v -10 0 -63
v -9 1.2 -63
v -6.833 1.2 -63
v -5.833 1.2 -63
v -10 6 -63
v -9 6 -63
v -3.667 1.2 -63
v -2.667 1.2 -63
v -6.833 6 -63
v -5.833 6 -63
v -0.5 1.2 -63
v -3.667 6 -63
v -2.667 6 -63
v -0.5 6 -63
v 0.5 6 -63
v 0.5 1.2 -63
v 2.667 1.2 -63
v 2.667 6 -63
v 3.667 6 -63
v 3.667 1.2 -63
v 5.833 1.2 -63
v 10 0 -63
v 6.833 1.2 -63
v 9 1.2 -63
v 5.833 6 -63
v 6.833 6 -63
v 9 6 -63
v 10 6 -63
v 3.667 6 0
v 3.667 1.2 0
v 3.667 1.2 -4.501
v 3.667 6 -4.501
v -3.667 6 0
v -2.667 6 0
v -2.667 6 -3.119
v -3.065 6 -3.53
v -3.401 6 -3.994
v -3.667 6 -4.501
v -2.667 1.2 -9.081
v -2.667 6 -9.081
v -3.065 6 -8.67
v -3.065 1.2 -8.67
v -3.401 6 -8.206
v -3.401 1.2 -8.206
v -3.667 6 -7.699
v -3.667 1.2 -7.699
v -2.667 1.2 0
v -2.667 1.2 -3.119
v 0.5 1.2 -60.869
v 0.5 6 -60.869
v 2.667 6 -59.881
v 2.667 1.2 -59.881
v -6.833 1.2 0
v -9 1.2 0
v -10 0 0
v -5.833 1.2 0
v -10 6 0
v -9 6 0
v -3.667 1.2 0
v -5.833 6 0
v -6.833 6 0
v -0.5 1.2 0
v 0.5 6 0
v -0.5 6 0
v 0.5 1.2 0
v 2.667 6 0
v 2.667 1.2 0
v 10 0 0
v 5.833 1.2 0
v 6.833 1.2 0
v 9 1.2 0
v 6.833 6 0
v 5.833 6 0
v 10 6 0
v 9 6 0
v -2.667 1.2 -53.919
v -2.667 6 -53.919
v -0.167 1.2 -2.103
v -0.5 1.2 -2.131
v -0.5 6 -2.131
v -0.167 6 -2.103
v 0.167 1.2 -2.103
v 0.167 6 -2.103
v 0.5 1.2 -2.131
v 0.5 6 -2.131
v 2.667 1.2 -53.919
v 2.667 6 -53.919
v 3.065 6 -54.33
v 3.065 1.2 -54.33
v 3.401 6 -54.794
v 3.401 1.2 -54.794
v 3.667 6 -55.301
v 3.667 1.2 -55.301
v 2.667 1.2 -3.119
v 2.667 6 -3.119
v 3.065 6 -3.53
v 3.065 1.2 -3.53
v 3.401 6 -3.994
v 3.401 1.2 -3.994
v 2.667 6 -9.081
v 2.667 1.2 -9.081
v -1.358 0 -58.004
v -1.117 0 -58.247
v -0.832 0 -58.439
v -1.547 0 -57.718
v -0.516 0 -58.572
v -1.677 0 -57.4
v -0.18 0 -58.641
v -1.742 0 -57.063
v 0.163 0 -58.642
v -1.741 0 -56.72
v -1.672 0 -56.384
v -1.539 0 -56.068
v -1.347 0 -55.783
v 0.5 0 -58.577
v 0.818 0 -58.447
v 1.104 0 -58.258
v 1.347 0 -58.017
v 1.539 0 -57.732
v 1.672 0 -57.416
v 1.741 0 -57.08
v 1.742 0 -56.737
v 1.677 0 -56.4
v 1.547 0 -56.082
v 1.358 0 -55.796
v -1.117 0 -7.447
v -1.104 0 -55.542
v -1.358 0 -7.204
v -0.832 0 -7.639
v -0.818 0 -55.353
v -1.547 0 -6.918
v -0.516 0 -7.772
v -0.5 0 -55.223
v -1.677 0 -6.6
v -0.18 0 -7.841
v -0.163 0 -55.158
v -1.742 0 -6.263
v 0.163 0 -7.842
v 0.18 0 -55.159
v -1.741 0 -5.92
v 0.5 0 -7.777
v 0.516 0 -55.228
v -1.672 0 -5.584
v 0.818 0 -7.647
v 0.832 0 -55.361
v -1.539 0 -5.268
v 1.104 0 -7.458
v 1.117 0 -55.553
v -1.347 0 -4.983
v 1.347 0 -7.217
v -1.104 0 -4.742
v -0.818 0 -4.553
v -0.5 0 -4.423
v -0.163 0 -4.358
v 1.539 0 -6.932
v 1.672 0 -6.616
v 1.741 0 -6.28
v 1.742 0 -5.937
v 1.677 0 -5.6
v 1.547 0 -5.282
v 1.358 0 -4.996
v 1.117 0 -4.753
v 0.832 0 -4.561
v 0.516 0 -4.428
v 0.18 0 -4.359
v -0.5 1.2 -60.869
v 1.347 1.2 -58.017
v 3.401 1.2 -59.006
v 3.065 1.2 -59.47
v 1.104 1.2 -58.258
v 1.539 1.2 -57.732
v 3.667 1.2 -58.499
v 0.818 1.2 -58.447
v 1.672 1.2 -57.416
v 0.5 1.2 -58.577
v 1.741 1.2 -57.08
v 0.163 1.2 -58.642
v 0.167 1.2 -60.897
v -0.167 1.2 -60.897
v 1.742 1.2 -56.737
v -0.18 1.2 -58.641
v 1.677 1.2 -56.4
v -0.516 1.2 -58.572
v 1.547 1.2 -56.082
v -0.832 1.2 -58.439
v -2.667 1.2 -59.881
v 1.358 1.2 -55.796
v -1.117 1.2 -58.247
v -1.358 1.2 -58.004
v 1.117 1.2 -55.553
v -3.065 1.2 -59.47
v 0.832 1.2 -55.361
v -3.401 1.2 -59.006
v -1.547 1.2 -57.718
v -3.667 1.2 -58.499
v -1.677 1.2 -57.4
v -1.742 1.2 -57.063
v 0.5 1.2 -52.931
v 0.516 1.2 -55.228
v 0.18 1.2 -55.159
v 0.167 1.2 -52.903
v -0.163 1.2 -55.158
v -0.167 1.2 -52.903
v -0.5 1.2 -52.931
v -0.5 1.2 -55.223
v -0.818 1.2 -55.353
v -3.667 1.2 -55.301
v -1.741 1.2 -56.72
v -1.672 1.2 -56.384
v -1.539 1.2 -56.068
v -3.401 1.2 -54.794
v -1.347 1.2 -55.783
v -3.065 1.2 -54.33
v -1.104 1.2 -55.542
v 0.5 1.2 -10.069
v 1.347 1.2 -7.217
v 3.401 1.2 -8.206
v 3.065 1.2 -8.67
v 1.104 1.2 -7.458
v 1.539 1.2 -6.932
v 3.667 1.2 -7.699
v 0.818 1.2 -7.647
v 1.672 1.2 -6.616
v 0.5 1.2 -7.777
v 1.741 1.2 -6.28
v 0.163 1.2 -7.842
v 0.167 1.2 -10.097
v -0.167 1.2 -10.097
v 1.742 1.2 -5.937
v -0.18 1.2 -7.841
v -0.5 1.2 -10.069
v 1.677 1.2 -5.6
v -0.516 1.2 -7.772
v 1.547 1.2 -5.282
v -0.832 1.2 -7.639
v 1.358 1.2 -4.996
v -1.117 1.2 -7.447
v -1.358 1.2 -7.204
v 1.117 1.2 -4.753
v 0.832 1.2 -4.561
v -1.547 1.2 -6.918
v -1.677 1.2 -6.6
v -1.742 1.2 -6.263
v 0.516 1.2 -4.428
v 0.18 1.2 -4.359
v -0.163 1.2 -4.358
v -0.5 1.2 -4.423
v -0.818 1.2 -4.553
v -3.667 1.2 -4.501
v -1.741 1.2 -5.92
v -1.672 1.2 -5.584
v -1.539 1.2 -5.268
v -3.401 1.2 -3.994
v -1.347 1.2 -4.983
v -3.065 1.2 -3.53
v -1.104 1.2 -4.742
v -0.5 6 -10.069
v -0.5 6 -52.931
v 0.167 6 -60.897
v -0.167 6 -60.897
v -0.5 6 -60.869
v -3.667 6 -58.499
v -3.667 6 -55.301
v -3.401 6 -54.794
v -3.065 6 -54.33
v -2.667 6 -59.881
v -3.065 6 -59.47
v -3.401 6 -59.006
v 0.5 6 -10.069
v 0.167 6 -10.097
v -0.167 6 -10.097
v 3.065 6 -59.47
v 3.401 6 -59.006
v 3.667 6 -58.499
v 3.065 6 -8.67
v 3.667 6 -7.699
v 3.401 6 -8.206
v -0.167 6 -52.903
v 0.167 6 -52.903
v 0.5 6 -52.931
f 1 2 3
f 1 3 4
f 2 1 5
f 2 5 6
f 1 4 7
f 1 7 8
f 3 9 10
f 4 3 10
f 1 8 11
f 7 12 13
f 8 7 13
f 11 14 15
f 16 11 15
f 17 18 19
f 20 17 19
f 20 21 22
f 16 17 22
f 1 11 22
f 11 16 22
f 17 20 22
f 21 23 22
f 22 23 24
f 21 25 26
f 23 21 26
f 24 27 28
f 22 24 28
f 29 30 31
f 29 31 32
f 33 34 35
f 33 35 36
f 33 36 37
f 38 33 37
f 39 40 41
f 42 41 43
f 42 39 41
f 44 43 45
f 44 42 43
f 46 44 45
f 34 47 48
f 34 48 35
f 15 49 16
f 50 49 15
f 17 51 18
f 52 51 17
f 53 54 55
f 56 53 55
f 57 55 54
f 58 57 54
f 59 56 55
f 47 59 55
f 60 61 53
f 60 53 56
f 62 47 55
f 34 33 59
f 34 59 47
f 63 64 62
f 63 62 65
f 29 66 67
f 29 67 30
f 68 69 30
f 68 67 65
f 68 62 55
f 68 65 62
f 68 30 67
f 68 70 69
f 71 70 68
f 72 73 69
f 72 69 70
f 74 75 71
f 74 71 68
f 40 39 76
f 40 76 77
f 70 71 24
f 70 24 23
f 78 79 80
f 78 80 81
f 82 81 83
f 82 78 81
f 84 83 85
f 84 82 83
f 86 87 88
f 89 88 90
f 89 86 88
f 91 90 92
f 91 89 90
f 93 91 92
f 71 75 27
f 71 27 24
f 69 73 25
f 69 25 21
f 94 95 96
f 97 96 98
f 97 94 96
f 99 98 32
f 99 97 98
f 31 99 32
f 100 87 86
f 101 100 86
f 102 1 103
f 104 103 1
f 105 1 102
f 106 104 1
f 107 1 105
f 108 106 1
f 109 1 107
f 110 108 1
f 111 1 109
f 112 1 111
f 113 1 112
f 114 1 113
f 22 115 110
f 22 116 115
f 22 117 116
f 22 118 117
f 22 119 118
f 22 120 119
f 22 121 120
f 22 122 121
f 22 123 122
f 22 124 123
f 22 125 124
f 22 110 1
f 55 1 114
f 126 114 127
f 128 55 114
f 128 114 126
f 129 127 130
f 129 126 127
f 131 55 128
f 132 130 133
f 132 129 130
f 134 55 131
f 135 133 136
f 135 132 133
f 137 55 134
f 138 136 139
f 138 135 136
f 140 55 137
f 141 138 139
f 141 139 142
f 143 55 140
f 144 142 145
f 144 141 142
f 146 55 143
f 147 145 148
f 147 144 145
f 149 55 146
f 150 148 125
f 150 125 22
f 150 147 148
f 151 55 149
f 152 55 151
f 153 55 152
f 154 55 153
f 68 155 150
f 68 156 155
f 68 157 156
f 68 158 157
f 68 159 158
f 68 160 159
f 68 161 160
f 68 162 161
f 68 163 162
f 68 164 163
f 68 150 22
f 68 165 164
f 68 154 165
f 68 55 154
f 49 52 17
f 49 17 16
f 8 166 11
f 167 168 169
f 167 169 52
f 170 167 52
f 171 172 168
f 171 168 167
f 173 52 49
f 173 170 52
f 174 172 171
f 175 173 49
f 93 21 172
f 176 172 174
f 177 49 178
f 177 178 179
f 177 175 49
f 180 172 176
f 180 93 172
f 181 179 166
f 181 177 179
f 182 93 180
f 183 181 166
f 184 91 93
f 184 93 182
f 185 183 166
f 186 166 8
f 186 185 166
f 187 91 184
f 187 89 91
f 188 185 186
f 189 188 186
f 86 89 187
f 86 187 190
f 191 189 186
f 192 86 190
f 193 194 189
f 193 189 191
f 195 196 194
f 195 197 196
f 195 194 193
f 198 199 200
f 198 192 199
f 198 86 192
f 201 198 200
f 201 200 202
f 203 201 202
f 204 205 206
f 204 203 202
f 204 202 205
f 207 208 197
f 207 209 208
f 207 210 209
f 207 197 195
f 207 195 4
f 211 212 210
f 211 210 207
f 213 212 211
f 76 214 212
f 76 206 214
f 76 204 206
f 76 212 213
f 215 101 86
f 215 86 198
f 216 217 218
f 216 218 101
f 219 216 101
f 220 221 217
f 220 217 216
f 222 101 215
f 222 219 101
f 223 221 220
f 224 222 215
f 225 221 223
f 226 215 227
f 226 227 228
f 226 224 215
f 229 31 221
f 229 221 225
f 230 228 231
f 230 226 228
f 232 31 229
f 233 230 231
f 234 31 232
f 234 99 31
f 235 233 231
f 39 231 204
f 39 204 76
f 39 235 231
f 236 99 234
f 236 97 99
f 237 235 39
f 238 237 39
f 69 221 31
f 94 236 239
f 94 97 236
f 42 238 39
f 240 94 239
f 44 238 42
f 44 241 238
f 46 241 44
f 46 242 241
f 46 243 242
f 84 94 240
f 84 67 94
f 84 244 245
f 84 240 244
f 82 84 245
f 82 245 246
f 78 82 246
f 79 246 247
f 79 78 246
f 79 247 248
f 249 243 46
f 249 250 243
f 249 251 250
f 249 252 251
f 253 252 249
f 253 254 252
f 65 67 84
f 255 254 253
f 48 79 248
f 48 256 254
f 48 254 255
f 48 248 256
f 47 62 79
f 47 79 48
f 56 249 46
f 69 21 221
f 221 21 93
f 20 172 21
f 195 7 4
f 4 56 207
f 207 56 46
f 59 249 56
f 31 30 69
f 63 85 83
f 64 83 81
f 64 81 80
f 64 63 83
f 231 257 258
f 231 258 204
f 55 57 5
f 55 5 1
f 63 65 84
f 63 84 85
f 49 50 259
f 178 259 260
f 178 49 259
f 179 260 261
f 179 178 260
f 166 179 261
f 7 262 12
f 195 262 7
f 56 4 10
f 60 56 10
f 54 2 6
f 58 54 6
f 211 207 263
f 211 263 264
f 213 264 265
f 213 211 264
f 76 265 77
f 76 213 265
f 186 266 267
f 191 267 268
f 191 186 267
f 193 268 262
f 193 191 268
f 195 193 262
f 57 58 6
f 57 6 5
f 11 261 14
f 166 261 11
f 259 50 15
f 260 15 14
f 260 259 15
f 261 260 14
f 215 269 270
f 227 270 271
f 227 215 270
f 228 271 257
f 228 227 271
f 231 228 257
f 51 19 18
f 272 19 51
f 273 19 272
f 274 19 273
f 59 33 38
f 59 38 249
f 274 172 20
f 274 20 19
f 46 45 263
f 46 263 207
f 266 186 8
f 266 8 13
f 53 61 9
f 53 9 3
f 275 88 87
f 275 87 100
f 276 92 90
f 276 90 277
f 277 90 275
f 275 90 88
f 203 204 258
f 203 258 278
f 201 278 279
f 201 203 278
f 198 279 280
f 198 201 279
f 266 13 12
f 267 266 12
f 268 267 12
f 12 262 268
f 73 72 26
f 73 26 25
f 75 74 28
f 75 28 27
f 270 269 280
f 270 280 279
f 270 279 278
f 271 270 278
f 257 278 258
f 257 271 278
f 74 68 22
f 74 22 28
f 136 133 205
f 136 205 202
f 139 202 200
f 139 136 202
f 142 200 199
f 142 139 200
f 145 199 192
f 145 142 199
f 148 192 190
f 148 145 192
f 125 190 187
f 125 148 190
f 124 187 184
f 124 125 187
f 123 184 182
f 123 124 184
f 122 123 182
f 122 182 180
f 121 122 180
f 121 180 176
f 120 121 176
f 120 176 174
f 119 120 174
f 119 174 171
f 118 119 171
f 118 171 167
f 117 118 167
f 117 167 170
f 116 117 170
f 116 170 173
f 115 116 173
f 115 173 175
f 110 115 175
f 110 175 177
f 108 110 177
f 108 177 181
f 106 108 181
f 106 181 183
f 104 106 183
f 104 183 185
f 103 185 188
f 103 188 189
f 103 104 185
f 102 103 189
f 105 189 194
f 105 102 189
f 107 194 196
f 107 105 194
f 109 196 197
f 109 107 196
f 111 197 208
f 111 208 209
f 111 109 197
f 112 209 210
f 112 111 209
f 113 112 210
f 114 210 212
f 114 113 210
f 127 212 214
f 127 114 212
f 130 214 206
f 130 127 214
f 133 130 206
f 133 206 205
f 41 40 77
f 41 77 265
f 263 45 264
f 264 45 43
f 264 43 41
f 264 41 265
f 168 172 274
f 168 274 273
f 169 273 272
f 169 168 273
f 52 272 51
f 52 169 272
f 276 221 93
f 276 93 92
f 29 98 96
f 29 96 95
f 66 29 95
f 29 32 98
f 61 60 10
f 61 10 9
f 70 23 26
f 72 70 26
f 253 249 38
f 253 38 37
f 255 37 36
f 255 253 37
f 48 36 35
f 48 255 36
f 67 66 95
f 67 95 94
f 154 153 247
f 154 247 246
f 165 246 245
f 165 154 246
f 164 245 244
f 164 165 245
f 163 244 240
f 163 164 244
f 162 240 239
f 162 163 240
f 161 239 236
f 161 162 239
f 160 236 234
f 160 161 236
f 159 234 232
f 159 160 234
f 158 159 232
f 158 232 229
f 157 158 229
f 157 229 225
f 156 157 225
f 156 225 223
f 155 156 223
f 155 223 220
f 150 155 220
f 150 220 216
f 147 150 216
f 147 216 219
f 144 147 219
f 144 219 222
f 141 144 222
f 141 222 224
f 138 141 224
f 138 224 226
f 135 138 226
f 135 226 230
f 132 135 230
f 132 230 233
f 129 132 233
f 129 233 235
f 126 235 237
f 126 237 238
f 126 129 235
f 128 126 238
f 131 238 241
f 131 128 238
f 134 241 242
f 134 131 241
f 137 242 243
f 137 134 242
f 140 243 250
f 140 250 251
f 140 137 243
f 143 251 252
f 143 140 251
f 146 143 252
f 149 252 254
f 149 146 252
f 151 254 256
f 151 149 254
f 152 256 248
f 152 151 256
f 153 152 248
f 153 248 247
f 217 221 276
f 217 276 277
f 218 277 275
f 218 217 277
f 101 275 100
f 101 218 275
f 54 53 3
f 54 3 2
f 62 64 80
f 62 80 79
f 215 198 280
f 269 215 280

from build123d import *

# Parameters (mm, degrees)
BOSS_EXTRUDE1_DEPTH     = 63
CUT_EXTRUDE2_DEPTH      = 65.070273919
CUT_EXTRUDE2_DEPTH_BACK = 65.070273919
SKETCH2_R               = 1.75
CUT_EXTRUDE3_START      = 1.2
SKETCH3_R               = 4
CUT_EXTRUDE3_DEPTH      = 63


with BuildPart() as part:
    # Sketch1 → Boss-Extrude1 (new body)
    with BuildSketch(Plane.XY):
        Polygon((-10, 6), (-10, 0), (10, 0), (10, 6), (9, 6), (9, 1.2), (6.833333333, 1.2), (6.833333333, 6), (5.833333333, 6), (5.833333333, 1.2), (3.666666667, 1.2), (3.666666667, 6), (2.666666667, 6), (2.666666667, 1.2), (0.5, 1.2), (0.5, 6), (-0.5, 6), (-0.5, 1.2), (-2.666666667, 1.2), (-2.666666667, 6), (-3.666666667, 6), (-3.666666667, 1.2), (-5.833333333, 1.2), (-5.833333333, 6), (-6.833333333, 6), (-6.833333333, 1.2), (-9, 1.2), (-9, 6), align=None)
    extrude(amount=-BOSS_EXTRUDE1_DEPTH)

    # Sketch2 → Cut-Extrude2 (cut, two sides: drawn at the far end of the back side and taken through both)
    with BuildSketch(Plane(origin=(0, 0, 0), x_dir=(1, 0, 0), z_dir=(0, 1, 0)).offset(-CUT_EXTRUDE2_DEPTH_BACK)):
        with Locations(Location((0, 56.9, 0), (0, 0, 253.398450401))):
            Circle(SKETCH2_R)
        with Locations(Location((0, 6.1, 0), (0, 0, 253.398450401))):
            Circle(SKETCH2_R)
    extrude(amount=CUT_EXTRUDE2_DEPTH + CUT_EXTRUDE2_DEPTH_BACK, mode=Mode.SUBTRACT)

    # Sketch3 → Cut-Extrude3 (cut)
    with BuildSketch(Plane(origin=(0, 0, 0), x_dir=(1, 0, 0), z_dir=(0, 1, 0)).offset(CUT_EXTRUDE3_START)):
        with Locations((0, 56.9)):
            Circle(SKETCH3_R)
        with Locations((0, 6.1)):
            Circle(SKETCH3_R)
    extrude(amount=CUT_EXTRUDE3_DEPTH, mode=Mode.SUBTRACT)


solid = part.part
